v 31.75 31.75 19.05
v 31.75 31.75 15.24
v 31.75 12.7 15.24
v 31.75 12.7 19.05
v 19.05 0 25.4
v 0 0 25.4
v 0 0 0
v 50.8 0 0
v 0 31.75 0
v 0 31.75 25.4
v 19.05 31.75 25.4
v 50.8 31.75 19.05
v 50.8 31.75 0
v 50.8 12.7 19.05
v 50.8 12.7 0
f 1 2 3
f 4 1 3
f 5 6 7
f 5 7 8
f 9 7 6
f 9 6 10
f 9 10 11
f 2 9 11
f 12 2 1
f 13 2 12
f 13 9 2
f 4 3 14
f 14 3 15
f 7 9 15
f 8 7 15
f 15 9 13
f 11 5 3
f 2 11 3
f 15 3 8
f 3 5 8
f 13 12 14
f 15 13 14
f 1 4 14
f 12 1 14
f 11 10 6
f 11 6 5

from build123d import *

# Parameters (mm, degrees)
F0_W     = 50.8
F0_H     = 31.75
F1_DEPTH = 25.4
F3_DEPTH = 31.75
F4_W     = 19.05
F4_H     = 19.05
F5_DEPTH = 19.05


with BuildPart() as f1:
    # F0 (on Top) → F1 (new body)
    with BuildSketch(Plane.XY):
        with Locations((25.4, 15.875)):
            Rectangle(F0_W, F0_H)
    extrude(amount=F1_DEPTH)

    # F2 (on face) → F3 (cut)
    with BuildSketch(Plane.XZ):
        Polygon((19.05, 25.4), (50.8, 0), (50.8, 25.4), align=None)
    extrude(amount=-F3_DEPTH, mode=Mode.SUBTRACT)

    # F4 (on face) → F5 (join)
    with BuildSketch(Plane(origin=(0, 0, 0), x_dir=(1, 0, 0), z_dir=(0, 0, -1))):
        with Locations((41.275, -22.225)):
            Rectangle(F4_W, F4_H)
    extrude(amount=-F5_DEPTH)


solid = f1.part
